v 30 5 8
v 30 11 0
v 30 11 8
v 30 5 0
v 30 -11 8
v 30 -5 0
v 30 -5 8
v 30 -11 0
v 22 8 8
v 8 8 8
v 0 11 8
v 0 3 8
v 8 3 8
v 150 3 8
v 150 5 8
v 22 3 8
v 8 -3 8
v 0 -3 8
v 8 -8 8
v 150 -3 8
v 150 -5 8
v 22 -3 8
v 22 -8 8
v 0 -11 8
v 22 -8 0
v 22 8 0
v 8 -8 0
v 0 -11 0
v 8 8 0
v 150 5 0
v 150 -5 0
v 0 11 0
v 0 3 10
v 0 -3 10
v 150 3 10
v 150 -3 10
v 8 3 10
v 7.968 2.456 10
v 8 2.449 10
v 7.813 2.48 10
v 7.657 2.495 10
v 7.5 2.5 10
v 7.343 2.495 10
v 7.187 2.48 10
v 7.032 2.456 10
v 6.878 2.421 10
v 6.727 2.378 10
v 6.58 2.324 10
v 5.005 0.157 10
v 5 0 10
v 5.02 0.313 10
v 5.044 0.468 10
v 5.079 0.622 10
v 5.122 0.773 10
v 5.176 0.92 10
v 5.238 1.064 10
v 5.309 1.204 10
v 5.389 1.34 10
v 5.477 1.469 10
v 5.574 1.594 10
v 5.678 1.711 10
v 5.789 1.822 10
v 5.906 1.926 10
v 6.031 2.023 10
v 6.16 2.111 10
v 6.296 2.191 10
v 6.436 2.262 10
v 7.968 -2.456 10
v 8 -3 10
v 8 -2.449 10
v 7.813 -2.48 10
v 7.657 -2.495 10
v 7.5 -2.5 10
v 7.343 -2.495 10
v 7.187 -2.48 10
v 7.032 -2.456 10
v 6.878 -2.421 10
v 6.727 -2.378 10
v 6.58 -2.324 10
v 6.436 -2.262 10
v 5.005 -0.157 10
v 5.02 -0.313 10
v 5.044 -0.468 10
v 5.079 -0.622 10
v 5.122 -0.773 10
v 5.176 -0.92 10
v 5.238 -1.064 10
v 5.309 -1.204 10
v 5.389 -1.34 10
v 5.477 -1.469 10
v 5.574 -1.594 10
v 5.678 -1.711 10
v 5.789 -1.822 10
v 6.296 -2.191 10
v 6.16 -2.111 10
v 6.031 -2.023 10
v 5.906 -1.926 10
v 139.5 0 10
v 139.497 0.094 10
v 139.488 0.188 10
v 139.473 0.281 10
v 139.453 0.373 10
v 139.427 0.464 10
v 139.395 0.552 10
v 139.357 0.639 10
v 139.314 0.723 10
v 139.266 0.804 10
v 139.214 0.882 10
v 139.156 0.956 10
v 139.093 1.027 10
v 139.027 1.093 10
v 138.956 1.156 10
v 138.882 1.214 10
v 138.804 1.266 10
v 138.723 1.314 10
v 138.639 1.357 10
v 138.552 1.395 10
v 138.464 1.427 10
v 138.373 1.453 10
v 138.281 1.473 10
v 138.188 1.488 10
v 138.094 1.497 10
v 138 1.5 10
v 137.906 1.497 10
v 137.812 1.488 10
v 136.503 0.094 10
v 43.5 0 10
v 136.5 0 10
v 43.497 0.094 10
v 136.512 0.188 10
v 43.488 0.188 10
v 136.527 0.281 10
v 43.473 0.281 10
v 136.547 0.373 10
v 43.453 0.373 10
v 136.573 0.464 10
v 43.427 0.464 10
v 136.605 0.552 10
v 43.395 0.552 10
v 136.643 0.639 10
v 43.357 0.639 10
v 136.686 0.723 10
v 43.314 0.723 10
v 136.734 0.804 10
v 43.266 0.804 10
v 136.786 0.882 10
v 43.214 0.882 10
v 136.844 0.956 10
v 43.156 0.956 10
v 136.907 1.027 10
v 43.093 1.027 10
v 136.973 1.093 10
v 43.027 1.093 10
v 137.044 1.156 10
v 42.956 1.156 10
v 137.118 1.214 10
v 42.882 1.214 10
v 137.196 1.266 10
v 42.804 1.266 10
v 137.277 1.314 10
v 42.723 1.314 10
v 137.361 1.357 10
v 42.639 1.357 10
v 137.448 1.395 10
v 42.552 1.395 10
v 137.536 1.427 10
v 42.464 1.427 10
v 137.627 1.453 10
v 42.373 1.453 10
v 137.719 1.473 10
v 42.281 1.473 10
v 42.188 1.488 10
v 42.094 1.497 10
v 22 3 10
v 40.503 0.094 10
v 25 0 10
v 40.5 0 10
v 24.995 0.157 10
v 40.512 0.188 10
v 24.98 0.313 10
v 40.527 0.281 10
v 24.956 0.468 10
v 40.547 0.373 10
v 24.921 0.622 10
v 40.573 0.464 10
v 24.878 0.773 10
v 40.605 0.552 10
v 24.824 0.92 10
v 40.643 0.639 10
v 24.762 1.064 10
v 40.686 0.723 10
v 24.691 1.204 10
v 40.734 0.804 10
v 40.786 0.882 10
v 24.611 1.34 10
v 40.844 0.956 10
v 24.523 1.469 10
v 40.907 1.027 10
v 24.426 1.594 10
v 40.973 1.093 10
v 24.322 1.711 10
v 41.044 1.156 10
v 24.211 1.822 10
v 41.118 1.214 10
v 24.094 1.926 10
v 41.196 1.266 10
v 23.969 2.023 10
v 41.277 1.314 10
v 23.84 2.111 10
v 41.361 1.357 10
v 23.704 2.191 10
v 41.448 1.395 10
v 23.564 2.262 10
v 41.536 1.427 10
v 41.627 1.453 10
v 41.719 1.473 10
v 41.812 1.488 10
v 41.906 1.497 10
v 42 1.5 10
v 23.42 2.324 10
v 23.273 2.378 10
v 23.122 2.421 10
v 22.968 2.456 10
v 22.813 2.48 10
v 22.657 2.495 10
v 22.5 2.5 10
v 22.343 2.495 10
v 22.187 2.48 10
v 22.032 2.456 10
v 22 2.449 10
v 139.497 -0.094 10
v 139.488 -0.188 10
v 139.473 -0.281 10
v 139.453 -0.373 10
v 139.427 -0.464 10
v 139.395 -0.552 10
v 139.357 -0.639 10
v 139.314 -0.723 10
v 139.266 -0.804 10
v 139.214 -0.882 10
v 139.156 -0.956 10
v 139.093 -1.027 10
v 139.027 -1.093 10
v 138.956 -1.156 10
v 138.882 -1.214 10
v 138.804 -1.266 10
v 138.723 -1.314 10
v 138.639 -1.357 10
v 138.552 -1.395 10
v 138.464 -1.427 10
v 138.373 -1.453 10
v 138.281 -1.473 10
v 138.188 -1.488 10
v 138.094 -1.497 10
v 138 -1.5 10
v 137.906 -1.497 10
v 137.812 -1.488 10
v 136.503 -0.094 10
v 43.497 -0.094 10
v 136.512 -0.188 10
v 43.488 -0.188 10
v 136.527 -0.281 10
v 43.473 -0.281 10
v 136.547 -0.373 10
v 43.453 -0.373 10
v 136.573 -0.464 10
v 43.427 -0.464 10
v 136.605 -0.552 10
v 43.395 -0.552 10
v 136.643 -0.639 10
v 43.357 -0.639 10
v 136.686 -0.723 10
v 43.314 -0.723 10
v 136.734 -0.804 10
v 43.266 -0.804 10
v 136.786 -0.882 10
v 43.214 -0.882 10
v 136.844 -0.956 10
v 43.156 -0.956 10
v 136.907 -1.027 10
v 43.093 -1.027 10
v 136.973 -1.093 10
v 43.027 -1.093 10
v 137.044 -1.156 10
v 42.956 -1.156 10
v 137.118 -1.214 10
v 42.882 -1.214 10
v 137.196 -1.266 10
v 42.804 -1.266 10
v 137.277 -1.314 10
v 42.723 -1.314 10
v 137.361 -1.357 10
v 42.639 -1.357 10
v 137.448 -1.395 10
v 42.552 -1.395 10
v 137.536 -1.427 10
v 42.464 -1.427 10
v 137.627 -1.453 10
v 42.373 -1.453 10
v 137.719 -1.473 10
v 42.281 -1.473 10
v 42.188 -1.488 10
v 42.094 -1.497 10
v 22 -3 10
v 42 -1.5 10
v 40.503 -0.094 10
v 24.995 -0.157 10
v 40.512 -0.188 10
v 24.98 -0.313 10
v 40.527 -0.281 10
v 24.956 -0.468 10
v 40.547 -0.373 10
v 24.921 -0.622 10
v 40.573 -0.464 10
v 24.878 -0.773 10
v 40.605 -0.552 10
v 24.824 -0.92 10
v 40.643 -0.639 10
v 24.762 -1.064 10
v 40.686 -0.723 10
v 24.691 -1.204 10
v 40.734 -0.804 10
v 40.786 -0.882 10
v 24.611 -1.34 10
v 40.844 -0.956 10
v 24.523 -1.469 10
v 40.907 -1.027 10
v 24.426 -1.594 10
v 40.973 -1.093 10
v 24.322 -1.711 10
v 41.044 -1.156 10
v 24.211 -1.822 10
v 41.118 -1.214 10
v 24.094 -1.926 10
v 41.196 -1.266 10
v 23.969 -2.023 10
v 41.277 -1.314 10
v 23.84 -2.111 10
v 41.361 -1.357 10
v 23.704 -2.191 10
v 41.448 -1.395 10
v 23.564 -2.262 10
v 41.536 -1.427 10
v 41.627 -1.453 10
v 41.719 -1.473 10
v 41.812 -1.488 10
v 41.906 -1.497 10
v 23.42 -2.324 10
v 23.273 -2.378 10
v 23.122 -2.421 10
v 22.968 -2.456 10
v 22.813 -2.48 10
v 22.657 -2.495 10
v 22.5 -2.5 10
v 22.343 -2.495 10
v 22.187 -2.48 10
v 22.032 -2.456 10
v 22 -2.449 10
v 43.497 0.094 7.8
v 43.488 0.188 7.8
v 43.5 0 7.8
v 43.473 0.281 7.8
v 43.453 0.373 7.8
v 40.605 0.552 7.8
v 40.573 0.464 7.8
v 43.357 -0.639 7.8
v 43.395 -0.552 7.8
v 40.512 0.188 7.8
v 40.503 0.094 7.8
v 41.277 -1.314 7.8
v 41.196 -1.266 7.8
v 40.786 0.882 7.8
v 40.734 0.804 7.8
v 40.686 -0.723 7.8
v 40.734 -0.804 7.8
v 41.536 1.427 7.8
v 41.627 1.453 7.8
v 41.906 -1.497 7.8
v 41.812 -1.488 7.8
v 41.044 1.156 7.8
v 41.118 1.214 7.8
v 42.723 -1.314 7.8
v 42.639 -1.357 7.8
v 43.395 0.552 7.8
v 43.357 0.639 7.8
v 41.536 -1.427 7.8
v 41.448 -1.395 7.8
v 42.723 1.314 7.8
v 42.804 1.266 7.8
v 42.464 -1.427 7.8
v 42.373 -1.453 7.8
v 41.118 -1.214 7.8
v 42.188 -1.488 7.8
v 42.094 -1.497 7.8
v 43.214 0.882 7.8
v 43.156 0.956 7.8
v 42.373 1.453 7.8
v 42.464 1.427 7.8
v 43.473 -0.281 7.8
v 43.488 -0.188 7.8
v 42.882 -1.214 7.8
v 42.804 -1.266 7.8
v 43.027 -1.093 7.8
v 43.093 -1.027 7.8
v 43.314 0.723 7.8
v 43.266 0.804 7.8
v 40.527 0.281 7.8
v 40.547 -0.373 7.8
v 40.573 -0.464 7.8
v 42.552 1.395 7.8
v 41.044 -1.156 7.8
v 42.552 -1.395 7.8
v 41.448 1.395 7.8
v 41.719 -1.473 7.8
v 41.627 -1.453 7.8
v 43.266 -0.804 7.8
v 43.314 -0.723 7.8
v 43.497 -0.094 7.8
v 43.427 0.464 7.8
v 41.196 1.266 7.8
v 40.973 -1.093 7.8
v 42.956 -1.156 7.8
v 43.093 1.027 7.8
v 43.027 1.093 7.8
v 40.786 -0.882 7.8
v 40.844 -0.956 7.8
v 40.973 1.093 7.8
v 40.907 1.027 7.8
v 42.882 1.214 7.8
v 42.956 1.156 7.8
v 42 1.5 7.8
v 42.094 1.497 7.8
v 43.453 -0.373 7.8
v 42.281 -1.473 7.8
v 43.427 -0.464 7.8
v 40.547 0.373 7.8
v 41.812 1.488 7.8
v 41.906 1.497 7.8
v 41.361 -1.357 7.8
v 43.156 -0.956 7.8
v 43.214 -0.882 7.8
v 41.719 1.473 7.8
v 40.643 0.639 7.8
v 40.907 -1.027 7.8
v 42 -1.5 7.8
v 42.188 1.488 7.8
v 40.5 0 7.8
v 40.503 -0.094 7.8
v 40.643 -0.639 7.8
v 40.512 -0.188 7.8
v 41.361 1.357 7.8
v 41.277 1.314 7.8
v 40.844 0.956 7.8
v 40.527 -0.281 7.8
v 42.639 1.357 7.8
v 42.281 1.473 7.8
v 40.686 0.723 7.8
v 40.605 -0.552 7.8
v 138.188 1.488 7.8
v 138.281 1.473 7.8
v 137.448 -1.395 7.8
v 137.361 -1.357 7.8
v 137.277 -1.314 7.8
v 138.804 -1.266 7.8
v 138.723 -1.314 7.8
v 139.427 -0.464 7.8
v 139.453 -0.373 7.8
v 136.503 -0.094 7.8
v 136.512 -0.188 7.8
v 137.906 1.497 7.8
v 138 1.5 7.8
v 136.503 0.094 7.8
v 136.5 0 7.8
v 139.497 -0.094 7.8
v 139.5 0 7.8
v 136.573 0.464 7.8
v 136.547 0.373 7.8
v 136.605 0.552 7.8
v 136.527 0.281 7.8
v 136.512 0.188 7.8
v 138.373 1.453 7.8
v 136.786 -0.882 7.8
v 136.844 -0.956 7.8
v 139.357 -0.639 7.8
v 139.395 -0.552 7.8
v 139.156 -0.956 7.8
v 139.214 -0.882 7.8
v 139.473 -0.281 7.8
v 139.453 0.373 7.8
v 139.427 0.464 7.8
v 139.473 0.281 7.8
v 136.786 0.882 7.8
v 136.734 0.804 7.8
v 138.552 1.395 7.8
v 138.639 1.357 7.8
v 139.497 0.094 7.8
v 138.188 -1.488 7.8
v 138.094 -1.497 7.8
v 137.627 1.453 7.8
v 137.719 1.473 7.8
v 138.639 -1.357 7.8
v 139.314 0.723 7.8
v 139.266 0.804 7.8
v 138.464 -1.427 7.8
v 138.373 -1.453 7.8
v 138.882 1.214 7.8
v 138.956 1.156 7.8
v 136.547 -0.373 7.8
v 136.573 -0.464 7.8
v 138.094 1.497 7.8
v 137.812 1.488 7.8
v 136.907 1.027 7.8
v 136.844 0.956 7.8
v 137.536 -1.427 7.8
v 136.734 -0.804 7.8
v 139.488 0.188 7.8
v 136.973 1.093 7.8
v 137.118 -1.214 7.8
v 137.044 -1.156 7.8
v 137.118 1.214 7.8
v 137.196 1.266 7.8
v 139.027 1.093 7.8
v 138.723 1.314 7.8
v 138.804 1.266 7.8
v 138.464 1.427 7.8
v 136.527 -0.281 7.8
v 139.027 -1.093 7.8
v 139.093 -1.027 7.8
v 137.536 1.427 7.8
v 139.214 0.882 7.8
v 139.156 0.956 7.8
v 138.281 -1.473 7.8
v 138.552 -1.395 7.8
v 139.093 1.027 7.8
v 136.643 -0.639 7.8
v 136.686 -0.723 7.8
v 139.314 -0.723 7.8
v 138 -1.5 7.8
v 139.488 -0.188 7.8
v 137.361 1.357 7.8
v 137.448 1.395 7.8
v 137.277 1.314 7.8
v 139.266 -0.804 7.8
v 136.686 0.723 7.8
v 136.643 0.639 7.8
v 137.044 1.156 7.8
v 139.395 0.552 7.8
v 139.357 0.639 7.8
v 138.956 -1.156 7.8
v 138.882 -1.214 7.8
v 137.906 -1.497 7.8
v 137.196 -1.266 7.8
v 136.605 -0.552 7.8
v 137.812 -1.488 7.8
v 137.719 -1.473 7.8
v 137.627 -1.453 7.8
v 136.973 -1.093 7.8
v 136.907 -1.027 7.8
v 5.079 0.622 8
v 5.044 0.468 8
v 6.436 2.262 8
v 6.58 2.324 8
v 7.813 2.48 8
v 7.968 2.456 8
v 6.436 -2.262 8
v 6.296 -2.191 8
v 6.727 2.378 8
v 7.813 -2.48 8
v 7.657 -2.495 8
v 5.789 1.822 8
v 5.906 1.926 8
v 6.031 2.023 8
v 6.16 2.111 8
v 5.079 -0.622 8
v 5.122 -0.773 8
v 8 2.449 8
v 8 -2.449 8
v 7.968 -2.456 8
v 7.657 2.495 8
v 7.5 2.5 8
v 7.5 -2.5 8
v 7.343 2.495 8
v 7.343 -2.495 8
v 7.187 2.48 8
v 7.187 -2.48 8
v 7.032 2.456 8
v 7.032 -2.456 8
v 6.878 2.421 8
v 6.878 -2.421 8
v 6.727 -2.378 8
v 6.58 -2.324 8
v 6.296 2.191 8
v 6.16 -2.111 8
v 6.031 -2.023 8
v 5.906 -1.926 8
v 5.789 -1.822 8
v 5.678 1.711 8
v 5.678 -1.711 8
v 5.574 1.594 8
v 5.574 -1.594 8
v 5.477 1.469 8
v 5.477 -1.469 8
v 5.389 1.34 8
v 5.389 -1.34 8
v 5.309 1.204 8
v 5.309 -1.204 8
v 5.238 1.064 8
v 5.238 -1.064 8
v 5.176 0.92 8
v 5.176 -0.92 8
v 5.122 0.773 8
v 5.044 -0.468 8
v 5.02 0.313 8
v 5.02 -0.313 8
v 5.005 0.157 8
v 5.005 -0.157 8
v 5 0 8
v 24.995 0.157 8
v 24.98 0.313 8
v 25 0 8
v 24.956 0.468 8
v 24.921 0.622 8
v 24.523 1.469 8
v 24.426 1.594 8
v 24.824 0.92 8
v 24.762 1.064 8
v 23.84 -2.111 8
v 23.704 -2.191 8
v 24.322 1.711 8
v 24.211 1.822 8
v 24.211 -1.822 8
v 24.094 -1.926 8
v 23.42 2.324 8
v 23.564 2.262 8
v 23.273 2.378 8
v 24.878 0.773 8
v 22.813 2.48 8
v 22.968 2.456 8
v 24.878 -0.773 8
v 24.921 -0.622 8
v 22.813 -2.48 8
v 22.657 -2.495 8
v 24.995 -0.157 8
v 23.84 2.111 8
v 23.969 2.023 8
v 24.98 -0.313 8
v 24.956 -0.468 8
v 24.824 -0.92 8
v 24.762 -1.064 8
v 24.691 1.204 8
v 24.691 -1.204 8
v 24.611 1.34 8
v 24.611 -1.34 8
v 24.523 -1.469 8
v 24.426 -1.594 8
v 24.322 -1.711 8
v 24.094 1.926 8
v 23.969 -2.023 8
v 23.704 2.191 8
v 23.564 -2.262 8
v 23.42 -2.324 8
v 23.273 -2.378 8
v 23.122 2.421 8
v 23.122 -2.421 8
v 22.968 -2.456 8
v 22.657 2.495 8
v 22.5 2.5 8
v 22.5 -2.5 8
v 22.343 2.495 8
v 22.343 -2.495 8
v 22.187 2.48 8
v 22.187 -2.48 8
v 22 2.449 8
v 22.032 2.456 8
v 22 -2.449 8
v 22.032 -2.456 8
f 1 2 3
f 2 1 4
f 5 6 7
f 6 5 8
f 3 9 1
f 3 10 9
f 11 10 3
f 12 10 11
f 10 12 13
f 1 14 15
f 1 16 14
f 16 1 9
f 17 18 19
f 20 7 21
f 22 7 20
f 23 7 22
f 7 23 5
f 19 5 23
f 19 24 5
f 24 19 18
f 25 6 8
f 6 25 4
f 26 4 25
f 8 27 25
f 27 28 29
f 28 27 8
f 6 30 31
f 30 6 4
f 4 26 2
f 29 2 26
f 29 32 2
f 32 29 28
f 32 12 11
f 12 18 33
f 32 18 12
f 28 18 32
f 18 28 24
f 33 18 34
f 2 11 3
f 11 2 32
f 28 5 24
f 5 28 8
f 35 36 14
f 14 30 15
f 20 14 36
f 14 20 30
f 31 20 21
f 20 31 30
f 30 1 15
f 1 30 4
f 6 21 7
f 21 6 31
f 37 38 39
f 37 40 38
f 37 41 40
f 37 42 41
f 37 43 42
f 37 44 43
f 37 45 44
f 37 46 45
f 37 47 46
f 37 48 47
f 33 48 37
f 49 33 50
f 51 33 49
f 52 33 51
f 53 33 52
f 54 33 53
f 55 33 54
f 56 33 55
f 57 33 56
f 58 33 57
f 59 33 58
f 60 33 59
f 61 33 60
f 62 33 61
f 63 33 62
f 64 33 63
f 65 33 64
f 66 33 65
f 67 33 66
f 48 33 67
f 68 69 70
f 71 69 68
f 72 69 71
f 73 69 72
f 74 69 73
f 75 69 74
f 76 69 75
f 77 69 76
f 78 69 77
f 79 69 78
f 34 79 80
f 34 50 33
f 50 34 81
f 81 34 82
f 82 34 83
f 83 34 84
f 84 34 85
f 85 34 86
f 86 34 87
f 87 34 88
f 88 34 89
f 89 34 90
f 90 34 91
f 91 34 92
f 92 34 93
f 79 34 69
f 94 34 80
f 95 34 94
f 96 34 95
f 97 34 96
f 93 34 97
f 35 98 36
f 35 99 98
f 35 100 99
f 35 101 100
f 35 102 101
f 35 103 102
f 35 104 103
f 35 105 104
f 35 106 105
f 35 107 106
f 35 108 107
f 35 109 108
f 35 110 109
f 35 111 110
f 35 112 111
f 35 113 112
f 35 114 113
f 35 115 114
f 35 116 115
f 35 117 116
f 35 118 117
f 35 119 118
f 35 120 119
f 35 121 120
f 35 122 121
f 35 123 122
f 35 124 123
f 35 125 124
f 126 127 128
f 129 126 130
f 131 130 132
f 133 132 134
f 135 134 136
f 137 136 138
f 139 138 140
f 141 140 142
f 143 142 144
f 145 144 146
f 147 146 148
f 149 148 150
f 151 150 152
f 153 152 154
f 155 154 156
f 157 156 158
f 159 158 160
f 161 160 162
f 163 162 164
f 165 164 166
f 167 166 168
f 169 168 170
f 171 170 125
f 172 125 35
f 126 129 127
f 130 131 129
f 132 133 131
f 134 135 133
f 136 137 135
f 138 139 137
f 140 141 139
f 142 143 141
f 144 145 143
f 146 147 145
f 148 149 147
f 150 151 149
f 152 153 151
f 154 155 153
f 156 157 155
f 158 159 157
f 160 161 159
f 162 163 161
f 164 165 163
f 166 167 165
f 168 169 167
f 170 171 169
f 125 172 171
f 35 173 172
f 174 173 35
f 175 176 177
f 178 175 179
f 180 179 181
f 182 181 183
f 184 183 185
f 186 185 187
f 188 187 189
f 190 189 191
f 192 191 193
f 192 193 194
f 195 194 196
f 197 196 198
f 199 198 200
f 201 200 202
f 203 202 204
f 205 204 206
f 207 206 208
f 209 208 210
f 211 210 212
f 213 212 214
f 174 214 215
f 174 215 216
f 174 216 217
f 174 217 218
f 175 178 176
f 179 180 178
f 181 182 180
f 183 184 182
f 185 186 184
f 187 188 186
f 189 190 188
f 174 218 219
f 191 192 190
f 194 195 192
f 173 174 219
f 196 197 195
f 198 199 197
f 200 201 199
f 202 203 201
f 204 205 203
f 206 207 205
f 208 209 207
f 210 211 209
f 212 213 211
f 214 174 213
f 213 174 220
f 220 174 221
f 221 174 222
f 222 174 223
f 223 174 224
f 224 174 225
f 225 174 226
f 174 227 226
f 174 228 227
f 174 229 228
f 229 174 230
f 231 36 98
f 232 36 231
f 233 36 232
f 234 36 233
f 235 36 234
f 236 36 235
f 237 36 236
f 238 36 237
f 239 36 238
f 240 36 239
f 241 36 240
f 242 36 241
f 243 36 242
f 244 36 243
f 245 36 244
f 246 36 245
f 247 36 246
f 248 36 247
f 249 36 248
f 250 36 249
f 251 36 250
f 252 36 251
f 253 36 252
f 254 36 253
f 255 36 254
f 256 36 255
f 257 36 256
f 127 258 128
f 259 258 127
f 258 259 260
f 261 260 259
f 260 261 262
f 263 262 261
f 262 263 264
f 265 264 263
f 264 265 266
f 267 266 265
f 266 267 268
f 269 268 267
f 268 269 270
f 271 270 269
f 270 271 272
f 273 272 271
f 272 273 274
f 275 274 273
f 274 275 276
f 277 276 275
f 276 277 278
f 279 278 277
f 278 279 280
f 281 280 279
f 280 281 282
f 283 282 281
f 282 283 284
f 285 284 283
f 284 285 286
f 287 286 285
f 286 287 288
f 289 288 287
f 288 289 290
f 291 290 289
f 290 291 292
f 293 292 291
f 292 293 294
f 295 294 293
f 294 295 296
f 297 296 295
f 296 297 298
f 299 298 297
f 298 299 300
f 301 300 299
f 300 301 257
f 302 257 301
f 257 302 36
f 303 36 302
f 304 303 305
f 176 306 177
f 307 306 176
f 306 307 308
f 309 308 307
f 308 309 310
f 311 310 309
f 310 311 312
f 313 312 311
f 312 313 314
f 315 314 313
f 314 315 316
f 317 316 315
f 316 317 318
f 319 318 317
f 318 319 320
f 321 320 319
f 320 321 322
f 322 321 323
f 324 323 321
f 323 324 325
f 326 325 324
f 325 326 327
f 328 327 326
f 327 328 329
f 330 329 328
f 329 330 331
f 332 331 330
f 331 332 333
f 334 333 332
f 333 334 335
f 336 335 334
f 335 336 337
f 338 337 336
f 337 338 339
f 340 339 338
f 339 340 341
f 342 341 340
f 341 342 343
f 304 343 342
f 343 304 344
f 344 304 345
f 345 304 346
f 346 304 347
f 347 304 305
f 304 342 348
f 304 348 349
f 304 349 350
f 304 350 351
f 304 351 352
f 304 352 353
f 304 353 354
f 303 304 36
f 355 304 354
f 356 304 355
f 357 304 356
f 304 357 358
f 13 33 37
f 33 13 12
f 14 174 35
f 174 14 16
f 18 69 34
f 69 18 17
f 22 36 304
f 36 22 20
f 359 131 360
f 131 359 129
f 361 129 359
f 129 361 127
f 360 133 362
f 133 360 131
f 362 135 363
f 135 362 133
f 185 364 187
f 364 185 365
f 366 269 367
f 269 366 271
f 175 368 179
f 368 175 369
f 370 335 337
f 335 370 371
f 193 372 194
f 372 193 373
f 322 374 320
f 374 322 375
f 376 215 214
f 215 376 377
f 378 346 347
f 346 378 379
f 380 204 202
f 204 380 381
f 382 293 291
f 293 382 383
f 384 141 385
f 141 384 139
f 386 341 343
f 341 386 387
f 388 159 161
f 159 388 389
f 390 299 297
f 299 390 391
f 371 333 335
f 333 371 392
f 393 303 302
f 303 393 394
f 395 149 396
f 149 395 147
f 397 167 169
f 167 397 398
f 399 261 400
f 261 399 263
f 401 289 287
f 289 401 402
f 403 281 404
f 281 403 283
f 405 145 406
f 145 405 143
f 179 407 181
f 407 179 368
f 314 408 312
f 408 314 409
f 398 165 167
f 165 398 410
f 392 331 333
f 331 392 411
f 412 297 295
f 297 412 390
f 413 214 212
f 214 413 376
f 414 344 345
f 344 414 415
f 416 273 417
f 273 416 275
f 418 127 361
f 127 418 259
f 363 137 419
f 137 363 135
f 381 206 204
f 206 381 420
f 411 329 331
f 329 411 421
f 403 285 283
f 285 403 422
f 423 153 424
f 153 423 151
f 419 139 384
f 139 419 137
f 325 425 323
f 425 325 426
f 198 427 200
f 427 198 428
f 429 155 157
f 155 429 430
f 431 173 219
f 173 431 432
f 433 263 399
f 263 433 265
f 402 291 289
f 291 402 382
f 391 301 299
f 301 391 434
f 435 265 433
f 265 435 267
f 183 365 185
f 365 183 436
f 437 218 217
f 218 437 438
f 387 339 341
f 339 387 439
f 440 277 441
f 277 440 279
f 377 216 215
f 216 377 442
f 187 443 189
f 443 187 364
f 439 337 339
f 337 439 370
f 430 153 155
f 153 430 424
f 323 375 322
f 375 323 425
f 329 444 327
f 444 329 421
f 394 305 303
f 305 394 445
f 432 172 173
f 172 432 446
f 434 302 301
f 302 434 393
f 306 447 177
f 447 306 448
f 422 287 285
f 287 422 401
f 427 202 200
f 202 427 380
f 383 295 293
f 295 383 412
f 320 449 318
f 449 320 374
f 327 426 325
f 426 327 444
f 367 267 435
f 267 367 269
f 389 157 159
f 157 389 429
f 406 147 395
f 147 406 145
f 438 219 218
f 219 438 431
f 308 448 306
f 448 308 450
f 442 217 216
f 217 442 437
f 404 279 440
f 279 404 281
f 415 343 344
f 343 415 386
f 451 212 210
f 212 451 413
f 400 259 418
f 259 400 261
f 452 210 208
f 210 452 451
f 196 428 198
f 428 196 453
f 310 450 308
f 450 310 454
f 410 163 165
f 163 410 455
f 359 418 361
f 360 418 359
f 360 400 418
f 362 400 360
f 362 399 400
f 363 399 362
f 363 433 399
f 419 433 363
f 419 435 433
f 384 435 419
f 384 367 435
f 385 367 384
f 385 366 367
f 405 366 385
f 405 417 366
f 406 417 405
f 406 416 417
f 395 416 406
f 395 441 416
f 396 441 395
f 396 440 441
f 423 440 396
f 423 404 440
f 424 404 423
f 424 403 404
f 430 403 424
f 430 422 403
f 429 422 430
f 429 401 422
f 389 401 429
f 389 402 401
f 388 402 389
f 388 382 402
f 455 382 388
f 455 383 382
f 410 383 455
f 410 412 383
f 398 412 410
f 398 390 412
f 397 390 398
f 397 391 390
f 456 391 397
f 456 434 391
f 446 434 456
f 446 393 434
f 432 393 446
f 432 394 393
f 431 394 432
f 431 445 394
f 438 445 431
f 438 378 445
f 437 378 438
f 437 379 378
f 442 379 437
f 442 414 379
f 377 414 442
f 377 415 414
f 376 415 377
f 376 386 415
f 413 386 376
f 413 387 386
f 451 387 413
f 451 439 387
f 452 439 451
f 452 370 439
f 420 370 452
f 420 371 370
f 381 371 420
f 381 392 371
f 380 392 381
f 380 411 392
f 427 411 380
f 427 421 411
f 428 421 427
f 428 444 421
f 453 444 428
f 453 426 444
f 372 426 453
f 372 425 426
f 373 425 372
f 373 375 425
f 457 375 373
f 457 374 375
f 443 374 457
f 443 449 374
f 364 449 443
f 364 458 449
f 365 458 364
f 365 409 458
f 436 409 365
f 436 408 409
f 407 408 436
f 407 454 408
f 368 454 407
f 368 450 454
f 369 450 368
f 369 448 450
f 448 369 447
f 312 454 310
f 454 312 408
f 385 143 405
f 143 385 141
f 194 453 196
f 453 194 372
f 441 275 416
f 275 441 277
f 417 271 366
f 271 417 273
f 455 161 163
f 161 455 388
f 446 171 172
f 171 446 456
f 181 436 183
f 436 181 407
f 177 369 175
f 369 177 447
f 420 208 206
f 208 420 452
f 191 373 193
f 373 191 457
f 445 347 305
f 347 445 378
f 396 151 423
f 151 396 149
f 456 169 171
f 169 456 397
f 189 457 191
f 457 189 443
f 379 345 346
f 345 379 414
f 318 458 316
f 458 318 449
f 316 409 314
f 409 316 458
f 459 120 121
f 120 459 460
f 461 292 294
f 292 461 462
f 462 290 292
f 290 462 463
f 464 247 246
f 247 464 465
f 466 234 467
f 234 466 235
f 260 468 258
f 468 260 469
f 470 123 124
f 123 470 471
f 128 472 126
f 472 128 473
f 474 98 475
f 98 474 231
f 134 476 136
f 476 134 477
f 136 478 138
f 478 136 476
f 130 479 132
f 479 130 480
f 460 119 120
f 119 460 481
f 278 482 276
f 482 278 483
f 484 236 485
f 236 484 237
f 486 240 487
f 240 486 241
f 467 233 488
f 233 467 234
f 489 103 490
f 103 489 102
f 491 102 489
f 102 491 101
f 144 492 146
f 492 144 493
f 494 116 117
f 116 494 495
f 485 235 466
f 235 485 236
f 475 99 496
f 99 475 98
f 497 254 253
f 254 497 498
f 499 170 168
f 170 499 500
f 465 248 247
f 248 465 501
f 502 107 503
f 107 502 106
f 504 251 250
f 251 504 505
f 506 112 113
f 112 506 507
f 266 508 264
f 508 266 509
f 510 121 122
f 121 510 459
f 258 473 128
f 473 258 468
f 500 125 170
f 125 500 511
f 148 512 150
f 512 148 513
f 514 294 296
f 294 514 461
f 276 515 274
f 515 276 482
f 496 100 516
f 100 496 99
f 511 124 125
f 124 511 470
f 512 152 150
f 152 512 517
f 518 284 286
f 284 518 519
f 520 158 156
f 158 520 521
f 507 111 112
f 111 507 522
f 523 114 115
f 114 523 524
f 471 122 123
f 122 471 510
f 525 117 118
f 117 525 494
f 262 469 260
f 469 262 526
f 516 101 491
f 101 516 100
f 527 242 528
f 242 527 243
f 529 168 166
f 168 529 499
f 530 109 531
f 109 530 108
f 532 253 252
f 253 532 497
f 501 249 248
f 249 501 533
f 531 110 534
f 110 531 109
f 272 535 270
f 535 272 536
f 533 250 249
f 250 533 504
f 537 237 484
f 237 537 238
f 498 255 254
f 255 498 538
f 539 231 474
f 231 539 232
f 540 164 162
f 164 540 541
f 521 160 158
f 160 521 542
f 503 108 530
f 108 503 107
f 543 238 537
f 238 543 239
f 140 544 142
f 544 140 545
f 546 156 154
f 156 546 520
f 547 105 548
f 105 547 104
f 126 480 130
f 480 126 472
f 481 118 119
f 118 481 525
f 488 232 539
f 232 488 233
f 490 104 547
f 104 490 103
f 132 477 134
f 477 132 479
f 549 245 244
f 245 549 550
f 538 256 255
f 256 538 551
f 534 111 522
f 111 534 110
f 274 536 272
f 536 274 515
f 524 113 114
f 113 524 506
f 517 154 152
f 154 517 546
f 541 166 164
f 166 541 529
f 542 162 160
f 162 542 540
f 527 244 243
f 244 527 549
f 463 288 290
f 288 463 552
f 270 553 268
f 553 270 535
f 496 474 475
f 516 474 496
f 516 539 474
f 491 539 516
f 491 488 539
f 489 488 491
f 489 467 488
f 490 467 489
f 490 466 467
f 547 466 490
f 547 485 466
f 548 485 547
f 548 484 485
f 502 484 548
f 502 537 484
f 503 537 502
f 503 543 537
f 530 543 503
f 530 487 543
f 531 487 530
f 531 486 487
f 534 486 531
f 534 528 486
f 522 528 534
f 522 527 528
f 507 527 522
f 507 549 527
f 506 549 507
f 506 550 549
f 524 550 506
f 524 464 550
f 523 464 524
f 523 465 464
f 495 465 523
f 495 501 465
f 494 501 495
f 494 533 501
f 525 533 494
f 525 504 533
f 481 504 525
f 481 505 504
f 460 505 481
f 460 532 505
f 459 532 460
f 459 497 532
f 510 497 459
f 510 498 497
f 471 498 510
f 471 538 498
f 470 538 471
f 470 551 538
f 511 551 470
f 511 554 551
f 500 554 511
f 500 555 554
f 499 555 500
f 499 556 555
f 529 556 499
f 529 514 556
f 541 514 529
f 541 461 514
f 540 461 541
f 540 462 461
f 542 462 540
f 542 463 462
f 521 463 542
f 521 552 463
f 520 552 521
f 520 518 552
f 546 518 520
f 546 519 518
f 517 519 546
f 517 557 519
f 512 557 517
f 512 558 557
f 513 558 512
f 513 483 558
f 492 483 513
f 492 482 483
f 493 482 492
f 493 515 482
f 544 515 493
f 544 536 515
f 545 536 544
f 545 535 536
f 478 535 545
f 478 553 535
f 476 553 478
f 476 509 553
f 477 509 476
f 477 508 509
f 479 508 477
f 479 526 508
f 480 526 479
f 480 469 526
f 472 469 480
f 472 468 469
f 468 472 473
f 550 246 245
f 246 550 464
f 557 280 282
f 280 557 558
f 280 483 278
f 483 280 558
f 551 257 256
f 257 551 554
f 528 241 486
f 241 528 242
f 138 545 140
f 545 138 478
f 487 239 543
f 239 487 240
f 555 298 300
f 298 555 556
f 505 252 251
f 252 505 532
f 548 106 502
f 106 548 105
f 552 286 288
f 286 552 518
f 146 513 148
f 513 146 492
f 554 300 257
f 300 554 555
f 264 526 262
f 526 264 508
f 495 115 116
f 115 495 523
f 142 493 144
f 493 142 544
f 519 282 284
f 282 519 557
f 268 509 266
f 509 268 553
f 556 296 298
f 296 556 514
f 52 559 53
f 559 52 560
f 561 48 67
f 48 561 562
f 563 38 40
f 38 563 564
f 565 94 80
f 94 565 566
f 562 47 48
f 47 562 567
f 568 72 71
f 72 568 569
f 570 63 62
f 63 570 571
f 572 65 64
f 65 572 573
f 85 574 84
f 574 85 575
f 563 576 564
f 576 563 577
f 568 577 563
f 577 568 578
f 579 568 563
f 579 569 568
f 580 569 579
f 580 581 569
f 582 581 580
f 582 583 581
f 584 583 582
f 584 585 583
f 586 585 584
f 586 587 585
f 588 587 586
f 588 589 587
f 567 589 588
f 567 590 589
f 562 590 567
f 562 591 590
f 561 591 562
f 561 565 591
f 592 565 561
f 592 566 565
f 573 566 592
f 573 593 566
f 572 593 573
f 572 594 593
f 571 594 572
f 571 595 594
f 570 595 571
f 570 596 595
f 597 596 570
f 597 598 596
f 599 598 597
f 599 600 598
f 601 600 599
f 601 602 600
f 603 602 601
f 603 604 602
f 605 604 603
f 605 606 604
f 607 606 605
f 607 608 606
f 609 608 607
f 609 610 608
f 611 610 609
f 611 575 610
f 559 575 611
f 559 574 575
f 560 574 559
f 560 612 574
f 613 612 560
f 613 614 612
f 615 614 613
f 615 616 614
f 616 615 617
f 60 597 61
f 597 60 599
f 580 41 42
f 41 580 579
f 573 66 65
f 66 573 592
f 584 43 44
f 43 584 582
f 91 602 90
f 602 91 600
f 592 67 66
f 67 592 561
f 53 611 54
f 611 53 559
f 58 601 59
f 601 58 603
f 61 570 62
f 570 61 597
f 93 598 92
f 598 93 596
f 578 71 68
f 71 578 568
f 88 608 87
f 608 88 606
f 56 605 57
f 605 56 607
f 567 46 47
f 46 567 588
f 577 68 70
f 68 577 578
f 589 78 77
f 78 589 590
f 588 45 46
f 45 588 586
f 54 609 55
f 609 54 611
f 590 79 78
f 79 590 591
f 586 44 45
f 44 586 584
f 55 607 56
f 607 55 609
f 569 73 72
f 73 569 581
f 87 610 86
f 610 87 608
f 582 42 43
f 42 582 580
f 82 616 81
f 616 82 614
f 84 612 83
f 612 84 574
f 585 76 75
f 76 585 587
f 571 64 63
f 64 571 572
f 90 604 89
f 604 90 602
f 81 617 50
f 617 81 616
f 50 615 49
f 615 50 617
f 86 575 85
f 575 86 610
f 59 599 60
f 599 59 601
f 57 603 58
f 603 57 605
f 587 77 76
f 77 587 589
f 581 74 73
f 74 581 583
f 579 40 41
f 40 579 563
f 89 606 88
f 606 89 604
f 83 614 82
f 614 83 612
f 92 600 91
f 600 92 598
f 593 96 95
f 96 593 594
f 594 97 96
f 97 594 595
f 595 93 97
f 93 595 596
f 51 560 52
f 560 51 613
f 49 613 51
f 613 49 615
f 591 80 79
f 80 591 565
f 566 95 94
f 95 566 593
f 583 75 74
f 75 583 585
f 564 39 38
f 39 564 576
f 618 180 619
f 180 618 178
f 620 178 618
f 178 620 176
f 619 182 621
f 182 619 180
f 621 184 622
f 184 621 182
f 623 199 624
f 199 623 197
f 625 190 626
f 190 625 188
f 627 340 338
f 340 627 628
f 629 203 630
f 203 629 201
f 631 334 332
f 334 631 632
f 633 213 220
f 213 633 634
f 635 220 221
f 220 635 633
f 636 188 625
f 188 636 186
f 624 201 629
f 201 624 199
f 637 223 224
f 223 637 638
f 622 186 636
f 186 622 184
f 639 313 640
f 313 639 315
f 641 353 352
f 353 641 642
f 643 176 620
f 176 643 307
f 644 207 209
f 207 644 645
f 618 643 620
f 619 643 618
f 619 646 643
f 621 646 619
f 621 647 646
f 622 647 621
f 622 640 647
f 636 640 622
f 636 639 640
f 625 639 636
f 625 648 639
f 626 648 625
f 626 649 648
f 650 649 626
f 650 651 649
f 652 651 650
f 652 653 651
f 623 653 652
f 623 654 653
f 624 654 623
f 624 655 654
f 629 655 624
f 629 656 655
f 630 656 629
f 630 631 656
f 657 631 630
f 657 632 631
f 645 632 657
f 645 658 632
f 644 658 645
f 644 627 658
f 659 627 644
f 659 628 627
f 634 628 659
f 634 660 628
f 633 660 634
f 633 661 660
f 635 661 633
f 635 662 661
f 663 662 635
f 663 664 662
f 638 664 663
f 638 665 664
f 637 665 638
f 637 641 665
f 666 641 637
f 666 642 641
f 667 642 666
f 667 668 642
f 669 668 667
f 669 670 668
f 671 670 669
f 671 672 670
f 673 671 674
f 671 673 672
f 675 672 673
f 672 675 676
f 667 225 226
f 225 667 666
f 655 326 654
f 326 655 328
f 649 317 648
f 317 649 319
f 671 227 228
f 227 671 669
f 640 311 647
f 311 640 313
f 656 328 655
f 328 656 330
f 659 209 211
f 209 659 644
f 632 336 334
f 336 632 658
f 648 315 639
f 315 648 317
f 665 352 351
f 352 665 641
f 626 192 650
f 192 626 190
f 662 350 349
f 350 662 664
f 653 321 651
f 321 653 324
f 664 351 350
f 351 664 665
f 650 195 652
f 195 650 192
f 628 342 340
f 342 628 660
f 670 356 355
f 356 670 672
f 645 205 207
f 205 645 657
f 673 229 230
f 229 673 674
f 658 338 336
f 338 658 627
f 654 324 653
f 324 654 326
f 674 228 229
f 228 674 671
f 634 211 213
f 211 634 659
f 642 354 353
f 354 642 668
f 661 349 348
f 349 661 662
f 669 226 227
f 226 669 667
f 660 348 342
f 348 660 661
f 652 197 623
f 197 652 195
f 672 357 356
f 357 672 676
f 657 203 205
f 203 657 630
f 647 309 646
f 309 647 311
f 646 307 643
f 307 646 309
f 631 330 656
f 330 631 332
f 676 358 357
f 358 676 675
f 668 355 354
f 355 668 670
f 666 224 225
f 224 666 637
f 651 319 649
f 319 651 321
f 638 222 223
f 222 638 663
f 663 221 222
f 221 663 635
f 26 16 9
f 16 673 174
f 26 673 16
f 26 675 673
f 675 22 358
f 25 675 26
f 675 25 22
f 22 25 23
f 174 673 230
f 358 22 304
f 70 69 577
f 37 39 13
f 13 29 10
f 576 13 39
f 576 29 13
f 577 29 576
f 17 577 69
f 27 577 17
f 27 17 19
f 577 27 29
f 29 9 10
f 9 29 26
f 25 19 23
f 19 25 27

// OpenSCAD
// Parameters
$fn = 100;

// Main rail dimensions
rail_length = 120;
rail_width = 10;
rail_height = 8;

// Shallow full-length top narrow band
top_layer_height = 2;
top_layer_width = 6;

// Wider block-like extension at one end
end_block_length = 30;
end_block_width = 22;

// Small circular removed features near the rail ends
rail_hole_diameter = 3;
rail_hole_depth = top_layer_height + 0.2; // cut through the shallow top layer
rail_hole_inset = 12;                     // distance from each rail end

// End block shallow circular recessing
shallow_recess_diameter = 5;
shallow_recess_depth = top_layer_height;
shallow_recess_x1 = end_block_length * 0.25;
shallow_recess_x2 = end_block_length * 0.75;

// End block much deeper cutout (through top layer and lower body)
deep_cutout_length = 14; // along X
deep_cutout_width = 16;  // along Y
deep_cutout_depth = rail_height + top_layer_height + 0.2;

// Derived overall length
total_length = end_block_length + rail_length;

// Assembly
difference() {
    union() {
        // Lower body: wider end block
        translate([0, -end_block_width / 2, 0])
            cube([end_block_length, end_block_width, rail_height]);

        // Lower body: long slim rail
        translate([end_block_length, -rail_width / 2, 0])
            cube([rail_length, rail_width, rail_height]);

        // Continuous shallow top layer over block and rail
        translate([0, -top_layer_width / 2, rail_height])
            cube([total_length, top_layer_width, top_layer_height]);
    }

    // Circular cuts near rail ends (along the narrow top band)
    translate([end_block_length + rail_hole_inset, 0, rail_height + top_layer_height - rail_hole_depth])
        cylinder(d = rail_hole_diameter, h = rail_hole_depth + 0.1);

    translate([total_length - rail_hole_inset, 0, rail_height + top_layer_height - rail_hole_depth])
        cylinder(d = rail_hole_diameter, h = rail_hole_depth + 0.1);

    // Shallow circular recesses on the end block
    translate([shallow_recess_x1, 0, rail_height + top_layer_height - shallow_recess_depth])
        cylinder(d = shallow_recess_diameter, h = shallow_recess_depth + 0.1);

    translate([shallow_recess_x2, 0, rail_height + top_layer_height - shallow_recess_depth])
        cylinder(d = shallow_recess_diameter, h = shallow_recess_depth + 0.1);

    // Deep rectangular cutout creating stepped depth through and below the lower body
    translate([end_block_length / 2 - deep_cutout_length / 2, -deep_cutout_width / 2, -0.1])
        cube([deep_cutout_length, deep_cutout_width, deep_cutout_depth]);
}
